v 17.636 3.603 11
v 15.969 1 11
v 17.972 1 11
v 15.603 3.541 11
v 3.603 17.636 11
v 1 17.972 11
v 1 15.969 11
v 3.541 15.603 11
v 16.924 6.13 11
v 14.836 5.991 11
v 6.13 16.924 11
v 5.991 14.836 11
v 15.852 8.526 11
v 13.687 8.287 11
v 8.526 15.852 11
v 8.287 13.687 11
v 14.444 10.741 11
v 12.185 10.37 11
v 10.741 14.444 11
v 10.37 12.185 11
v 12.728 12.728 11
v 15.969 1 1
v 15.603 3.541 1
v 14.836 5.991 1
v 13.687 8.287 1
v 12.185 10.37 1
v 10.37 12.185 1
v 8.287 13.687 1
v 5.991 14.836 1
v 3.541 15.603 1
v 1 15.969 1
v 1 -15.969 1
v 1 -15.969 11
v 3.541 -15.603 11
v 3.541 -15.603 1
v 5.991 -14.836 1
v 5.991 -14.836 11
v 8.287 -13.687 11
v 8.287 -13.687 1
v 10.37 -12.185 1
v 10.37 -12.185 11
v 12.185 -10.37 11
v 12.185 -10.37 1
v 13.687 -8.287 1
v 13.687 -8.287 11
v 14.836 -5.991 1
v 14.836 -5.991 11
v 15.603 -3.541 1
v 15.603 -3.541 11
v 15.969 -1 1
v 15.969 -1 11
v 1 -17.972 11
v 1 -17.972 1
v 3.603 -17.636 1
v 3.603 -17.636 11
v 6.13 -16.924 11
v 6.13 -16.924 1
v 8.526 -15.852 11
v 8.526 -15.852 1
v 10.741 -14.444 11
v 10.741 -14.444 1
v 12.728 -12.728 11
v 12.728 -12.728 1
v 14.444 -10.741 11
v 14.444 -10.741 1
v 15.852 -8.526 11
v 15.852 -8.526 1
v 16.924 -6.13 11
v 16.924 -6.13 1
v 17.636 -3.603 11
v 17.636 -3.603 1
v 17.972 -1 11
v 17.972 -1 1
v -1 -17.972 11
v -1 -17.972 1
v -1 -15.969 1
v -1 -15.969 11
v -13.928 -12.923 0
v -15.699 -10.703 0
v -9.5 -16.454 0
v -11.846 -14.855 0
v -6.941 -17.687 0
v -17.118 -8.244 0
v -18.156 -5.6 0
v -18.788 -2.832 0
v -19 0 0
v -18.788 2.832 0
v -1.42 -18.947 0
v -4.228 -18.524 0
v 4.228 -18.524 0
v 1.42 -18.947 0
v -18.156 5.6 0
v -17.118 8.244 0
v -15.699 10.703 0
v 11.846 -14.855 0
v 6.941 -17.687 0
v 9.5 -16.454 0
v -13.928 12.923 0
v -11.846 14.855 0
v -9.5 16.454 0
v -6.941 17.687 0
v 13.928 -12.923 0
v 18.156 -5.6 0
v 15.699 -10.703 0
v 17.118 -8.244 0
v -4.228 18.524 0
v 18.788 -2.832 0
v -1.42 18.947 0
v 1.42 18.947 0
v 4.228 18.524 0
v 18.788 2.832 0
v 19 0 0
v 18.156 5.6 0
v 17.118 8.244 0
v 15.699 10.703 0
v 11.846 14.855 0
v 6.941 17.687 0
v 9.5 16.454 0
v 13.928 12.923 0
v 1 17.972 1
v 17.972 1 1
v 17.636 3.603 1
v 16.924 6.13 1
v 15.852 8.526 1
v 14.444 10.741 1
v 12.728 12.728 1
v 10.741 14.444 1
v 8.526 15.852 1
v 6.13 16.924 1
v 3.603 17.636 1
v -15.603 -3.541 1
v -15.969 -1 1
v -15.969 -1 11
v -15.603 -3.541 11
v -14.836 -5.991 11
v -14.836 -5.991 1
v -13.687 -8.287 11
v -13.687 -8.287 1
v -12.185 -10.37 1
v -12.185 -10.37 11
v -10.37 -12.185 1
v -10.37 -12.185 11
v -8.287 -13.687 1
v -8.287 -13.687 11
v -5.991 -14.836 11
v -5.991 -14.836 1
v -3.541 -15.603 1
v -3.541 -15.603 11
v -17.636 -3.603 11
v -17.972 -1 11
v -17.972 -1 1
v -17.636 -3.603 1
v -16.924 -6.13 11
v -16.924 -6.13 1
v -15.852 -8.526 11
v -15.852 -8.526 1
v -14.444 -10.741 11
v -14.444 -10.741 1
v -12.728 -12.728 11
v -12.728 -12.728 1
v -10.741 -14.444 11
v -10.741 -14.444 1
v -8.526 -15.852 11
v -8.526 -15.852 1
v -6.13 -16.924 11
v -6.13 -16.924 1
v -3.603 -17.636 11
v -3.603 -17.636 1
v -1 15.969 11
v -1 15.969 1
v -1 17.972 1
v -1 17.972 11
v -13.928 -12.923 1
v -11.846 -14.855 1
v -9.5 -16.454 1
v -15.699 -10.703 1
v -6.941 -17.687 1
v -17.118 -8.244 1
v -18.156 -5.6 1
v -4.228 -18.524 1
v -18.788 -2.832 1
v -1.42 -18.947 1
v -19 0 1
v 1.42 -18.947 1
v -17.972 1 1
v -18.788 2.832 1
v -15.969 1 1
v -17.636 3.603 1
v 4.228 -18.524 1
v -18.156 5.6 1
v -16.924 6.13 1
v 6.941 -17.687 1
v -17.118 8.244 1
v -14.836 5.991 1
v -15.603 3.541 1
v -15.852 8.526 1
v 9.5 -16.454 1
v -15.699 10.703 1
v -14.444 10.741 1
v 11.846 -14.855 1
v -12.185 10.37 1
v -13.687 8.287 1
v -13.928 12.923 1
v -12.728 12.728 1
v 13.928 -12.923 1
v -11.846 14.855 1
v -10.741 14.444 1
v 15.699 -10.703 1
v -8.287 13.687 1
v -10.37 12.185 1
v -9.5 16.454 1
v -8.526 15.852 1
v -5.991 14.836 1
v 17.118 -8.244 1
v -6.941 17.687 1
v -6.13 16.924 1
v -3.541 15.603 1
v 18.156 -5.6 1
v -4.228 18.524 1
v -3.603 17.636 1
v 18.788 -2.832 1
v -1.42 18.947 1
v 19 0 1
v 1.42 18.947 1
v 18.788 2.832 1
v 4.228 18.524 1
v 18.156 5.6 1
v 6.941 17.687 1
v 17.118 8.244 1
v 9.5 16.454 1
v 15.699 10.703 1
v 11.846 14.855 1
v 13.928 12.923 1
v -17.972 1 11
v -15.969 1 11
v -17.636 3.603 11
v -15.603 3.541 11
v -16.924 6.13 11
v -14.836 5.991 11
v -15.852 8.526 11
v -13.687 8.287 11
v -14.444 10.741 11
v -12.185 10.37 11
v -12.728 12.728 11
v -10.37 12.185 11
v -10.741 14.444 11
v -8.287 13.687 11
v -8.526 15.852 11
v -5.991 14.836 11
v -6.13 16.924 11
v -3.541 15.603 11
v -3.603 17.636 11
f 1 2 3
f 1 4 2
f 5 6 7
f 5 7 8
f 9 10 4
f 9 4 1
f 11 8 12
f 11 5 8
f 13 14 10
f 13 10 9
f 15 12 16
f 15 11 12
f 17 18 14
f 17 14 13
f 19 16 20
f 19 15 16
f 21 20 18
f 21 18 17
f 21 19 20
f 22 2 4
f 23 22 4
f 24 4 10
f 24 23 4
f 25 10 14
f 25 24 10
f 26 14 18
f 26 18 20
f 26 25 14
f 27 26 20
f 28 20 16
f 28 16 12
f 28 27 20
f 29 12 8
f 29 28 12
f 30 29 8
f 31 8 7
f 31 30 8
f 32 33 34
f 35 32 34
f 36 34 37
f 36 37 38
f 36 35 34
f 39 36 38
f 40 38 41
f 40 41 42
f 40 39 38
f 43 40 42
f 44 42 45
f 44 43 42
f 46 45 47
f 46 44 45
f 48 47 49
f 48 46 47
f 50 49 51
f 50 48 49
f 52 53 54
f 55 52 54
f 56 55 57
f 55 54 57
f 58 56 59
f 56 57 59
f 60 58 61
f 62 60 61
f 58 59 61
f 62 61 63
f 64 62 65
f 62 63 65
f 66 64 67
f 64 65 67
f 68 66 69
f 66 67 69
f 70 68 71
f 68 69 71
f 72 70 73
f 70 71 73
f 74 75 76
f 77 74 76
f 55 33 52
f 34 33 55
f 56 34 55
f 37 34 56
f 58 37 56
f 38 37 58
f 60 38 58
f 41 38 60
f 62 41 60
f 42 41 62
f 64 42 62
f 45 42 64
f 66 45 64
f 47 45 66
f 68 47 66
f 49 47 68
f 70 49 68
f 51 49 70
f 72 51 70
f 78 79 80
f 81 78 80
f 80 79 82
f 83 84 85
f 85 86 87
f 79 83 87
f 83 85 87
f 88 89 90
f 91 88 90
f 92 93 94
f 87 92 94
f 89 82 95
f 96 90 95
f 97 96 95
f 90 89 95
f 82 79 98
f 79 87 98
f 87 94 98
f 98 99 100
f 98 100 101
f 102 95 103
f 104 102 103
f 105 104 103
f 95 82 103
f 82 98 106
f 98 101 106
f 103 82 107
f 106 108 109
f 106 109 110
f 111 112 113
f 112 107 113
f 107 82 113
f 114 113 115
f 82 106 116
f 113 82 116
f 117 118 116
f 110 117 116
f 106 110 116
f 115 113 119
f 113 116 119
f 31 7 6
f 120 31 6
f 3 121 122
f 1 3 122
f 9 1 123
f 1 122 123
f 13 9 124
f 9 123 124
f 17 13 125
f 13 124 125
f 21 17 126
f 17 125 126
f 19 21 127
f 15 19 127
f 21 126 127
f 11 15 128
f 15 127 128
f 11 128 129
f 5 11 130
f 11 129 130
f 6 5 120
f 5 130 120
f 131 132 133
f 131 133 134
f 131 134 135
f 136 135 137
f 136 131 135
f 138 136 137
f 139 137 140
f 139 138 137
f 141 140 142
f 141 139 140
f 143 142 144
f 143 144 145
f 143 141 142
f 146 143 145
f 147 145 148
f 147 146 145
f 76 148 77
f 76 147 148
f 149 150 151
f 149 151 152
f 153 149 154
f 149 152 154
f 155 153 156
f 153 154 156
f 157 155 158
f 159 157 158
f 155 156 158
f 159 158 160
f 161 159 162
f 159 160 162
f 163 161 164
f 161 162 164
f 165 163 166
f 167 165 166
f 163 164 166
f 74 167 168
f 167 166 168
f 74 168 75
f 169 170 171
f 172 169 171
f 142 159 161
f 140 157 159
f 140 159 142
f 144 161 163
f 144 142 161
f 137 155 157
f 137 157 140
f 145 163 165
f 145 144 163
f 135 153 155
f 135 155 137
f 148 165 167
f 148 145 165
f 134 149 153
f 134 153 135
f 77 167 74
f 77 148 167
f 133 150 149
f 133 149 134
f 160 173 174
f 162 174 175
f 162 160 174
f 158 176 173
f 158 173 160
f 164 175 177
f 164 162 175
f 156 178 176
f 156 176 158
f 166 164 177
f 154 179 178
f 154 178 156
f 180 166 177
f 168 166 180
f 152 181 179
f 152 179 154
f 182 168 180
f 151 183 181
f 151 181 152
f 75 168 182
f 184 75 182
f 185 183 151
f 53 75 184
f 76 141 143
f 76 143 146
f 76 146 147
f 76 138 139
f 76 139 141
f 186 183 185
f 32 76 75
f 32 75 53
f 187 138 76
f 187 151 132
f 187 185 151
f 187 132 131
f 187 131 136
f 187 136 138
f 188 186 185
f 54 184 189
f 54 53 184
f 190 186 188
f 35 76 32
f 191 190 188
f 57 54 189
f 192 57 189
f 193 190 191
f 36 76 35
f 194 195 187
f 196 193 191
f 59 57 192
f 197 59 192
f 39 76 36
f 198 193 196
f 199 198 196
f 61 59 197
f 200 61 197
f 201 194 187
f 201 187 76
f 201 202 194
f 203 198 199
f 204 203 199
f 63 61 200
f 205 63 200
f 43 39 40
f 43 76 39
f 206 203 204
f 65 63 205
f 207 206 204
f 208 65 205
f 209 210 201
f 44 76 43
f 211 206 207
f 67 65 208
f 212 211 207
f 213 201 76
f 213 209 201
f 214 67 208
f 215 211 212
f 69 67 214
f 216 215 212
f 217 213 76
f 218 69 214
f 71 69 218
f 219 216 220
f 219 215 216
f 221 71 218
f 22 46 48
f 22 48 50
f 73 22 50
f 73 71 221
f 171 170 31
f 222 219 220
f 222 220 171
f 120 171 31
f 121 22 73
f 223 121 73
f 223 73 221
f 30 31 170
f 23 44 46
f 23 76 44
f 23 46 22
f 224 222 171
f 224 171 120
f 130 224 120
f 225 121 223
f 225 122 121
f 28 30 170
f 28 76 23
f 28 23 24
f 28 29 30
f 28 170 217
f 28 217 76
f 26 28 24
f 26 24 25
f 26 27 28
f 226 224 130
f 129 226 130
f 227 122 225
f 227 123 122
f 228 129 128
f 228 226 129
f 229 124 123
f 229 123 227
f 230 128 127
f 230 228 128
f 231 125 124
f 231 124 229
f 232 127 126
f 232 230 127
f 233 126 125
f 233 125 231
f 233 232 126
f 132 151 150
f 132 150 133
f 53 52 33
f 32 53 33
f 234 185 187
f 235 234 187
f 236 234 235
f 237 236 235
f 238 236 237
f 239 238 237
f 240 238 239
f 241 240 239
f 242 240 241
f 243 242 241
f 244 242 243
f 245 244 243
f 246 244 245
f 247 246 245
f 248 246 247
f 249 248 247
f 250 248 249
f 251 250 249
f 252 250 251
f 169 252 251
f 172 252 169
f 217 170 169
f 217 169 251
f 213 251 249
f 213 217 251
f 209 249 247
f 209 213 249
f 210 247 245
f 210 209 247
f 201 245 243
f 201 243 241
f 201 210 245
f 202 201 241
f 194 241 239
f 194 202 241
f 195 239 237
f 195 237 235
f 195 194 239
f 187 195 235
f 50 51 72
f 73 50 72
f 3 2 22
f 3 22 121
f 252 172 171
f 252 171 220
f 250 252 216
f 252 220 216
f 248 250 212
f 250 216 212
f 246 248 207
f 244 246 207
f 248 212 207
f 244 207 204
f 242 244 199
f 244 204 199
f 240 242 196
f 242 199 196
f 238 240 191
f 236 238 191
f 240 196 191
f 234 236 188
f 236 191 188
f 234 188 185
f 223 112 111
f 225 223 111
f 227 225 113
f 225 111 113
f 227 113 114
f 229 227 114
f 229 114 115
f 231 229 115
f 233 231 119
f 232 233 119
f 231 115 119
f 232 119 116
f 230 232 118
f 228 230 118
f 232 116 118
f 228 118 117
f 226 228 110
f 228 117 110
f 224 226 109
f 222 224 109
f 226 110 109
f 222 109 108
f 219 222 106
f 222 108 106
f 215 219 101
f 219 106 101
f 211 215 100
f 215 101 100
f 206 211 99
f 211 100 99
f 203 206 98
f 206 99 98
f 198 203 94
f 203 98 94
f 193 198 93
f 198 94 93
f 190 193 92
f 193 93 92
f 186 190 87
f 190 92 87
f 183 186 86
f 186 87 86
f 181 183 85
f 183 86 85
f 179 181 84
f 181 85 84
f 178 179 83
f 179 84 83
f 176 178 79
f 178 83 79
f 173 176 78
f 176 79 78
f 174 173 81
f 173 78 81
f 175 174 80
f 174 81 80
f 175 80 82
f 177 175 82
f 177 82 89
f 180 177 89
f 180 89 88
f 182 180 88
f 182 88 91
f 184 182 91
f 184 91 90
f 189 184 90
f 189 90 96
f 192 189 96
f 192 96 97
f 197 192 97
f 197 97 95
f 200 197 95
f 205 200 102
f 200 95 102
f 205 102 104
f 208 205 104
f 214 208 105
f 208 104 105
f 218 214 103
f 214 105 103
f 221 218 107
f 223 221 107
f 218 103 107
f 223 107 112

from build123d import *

# Parameters (mm, degrees)
SKETCH1_R           = 19
BOSS_EXTRUDE1_DEPTH = 1
SKETCH2_R           = 18
SKETCH2_R_2         = 16
BOSS_EXTRUDE2_DEPTH = 10
SKETCH3_W           = 3
SKETCH3_H           = 2
SKETCH3_W_2         = 2
SKETCH3_H_2         = 3
CUT_EXTRUDE1_DEPTH  = 10


with BuildPart() as part:
    # Sketch1 → Boss-Extrude1 (new body)
    with BuildSketch(Plane(origin=(0, 0, 0), x_dir=(0, 1, 0), z_dir=(0, 0, 1))):
        with Locations(Location((0, 0, 0), (0, 0, 270))):
            Circle(SKETCH1_R)
    extrude(amount=BOSS_EXTRUDE1_DEPTH)

    # Sketch2 → Boss-Extrude2 (add)
    with BuildSketch(Plane.XY.offset(1)):
        Circle(SKETCH2_R)
        Circle(SKETCH2_R_2, mode=Mode.SUBTRACT)
    extrude(amount=BOSS_EXTRUDE2_DEPTH)

    # Sketch3 → Cut-Extrude1 (cut)
    with BuildSketch(Plane.XY.offset(11)):
        with Locations((17, 0)):
            Rectangle(SKETCH3_W, SKETCH3_H)
        with Locations((0, 17)):
            Rectangle(SKETCH3_W_2, SKETCH3_H_2)
        with Locations((0, -17)):
            Rectangle(SKETCH3_W_2, SKETCH3_H_2)
        with Locations((-17, 0)):
            Rectangle(SKETCH3_W, SKETCH3_H)
    extrude(amount=-CUT_EXTRUDE1_DEPTH, mode=Mode.SUBTRACT)


solid = part.part
